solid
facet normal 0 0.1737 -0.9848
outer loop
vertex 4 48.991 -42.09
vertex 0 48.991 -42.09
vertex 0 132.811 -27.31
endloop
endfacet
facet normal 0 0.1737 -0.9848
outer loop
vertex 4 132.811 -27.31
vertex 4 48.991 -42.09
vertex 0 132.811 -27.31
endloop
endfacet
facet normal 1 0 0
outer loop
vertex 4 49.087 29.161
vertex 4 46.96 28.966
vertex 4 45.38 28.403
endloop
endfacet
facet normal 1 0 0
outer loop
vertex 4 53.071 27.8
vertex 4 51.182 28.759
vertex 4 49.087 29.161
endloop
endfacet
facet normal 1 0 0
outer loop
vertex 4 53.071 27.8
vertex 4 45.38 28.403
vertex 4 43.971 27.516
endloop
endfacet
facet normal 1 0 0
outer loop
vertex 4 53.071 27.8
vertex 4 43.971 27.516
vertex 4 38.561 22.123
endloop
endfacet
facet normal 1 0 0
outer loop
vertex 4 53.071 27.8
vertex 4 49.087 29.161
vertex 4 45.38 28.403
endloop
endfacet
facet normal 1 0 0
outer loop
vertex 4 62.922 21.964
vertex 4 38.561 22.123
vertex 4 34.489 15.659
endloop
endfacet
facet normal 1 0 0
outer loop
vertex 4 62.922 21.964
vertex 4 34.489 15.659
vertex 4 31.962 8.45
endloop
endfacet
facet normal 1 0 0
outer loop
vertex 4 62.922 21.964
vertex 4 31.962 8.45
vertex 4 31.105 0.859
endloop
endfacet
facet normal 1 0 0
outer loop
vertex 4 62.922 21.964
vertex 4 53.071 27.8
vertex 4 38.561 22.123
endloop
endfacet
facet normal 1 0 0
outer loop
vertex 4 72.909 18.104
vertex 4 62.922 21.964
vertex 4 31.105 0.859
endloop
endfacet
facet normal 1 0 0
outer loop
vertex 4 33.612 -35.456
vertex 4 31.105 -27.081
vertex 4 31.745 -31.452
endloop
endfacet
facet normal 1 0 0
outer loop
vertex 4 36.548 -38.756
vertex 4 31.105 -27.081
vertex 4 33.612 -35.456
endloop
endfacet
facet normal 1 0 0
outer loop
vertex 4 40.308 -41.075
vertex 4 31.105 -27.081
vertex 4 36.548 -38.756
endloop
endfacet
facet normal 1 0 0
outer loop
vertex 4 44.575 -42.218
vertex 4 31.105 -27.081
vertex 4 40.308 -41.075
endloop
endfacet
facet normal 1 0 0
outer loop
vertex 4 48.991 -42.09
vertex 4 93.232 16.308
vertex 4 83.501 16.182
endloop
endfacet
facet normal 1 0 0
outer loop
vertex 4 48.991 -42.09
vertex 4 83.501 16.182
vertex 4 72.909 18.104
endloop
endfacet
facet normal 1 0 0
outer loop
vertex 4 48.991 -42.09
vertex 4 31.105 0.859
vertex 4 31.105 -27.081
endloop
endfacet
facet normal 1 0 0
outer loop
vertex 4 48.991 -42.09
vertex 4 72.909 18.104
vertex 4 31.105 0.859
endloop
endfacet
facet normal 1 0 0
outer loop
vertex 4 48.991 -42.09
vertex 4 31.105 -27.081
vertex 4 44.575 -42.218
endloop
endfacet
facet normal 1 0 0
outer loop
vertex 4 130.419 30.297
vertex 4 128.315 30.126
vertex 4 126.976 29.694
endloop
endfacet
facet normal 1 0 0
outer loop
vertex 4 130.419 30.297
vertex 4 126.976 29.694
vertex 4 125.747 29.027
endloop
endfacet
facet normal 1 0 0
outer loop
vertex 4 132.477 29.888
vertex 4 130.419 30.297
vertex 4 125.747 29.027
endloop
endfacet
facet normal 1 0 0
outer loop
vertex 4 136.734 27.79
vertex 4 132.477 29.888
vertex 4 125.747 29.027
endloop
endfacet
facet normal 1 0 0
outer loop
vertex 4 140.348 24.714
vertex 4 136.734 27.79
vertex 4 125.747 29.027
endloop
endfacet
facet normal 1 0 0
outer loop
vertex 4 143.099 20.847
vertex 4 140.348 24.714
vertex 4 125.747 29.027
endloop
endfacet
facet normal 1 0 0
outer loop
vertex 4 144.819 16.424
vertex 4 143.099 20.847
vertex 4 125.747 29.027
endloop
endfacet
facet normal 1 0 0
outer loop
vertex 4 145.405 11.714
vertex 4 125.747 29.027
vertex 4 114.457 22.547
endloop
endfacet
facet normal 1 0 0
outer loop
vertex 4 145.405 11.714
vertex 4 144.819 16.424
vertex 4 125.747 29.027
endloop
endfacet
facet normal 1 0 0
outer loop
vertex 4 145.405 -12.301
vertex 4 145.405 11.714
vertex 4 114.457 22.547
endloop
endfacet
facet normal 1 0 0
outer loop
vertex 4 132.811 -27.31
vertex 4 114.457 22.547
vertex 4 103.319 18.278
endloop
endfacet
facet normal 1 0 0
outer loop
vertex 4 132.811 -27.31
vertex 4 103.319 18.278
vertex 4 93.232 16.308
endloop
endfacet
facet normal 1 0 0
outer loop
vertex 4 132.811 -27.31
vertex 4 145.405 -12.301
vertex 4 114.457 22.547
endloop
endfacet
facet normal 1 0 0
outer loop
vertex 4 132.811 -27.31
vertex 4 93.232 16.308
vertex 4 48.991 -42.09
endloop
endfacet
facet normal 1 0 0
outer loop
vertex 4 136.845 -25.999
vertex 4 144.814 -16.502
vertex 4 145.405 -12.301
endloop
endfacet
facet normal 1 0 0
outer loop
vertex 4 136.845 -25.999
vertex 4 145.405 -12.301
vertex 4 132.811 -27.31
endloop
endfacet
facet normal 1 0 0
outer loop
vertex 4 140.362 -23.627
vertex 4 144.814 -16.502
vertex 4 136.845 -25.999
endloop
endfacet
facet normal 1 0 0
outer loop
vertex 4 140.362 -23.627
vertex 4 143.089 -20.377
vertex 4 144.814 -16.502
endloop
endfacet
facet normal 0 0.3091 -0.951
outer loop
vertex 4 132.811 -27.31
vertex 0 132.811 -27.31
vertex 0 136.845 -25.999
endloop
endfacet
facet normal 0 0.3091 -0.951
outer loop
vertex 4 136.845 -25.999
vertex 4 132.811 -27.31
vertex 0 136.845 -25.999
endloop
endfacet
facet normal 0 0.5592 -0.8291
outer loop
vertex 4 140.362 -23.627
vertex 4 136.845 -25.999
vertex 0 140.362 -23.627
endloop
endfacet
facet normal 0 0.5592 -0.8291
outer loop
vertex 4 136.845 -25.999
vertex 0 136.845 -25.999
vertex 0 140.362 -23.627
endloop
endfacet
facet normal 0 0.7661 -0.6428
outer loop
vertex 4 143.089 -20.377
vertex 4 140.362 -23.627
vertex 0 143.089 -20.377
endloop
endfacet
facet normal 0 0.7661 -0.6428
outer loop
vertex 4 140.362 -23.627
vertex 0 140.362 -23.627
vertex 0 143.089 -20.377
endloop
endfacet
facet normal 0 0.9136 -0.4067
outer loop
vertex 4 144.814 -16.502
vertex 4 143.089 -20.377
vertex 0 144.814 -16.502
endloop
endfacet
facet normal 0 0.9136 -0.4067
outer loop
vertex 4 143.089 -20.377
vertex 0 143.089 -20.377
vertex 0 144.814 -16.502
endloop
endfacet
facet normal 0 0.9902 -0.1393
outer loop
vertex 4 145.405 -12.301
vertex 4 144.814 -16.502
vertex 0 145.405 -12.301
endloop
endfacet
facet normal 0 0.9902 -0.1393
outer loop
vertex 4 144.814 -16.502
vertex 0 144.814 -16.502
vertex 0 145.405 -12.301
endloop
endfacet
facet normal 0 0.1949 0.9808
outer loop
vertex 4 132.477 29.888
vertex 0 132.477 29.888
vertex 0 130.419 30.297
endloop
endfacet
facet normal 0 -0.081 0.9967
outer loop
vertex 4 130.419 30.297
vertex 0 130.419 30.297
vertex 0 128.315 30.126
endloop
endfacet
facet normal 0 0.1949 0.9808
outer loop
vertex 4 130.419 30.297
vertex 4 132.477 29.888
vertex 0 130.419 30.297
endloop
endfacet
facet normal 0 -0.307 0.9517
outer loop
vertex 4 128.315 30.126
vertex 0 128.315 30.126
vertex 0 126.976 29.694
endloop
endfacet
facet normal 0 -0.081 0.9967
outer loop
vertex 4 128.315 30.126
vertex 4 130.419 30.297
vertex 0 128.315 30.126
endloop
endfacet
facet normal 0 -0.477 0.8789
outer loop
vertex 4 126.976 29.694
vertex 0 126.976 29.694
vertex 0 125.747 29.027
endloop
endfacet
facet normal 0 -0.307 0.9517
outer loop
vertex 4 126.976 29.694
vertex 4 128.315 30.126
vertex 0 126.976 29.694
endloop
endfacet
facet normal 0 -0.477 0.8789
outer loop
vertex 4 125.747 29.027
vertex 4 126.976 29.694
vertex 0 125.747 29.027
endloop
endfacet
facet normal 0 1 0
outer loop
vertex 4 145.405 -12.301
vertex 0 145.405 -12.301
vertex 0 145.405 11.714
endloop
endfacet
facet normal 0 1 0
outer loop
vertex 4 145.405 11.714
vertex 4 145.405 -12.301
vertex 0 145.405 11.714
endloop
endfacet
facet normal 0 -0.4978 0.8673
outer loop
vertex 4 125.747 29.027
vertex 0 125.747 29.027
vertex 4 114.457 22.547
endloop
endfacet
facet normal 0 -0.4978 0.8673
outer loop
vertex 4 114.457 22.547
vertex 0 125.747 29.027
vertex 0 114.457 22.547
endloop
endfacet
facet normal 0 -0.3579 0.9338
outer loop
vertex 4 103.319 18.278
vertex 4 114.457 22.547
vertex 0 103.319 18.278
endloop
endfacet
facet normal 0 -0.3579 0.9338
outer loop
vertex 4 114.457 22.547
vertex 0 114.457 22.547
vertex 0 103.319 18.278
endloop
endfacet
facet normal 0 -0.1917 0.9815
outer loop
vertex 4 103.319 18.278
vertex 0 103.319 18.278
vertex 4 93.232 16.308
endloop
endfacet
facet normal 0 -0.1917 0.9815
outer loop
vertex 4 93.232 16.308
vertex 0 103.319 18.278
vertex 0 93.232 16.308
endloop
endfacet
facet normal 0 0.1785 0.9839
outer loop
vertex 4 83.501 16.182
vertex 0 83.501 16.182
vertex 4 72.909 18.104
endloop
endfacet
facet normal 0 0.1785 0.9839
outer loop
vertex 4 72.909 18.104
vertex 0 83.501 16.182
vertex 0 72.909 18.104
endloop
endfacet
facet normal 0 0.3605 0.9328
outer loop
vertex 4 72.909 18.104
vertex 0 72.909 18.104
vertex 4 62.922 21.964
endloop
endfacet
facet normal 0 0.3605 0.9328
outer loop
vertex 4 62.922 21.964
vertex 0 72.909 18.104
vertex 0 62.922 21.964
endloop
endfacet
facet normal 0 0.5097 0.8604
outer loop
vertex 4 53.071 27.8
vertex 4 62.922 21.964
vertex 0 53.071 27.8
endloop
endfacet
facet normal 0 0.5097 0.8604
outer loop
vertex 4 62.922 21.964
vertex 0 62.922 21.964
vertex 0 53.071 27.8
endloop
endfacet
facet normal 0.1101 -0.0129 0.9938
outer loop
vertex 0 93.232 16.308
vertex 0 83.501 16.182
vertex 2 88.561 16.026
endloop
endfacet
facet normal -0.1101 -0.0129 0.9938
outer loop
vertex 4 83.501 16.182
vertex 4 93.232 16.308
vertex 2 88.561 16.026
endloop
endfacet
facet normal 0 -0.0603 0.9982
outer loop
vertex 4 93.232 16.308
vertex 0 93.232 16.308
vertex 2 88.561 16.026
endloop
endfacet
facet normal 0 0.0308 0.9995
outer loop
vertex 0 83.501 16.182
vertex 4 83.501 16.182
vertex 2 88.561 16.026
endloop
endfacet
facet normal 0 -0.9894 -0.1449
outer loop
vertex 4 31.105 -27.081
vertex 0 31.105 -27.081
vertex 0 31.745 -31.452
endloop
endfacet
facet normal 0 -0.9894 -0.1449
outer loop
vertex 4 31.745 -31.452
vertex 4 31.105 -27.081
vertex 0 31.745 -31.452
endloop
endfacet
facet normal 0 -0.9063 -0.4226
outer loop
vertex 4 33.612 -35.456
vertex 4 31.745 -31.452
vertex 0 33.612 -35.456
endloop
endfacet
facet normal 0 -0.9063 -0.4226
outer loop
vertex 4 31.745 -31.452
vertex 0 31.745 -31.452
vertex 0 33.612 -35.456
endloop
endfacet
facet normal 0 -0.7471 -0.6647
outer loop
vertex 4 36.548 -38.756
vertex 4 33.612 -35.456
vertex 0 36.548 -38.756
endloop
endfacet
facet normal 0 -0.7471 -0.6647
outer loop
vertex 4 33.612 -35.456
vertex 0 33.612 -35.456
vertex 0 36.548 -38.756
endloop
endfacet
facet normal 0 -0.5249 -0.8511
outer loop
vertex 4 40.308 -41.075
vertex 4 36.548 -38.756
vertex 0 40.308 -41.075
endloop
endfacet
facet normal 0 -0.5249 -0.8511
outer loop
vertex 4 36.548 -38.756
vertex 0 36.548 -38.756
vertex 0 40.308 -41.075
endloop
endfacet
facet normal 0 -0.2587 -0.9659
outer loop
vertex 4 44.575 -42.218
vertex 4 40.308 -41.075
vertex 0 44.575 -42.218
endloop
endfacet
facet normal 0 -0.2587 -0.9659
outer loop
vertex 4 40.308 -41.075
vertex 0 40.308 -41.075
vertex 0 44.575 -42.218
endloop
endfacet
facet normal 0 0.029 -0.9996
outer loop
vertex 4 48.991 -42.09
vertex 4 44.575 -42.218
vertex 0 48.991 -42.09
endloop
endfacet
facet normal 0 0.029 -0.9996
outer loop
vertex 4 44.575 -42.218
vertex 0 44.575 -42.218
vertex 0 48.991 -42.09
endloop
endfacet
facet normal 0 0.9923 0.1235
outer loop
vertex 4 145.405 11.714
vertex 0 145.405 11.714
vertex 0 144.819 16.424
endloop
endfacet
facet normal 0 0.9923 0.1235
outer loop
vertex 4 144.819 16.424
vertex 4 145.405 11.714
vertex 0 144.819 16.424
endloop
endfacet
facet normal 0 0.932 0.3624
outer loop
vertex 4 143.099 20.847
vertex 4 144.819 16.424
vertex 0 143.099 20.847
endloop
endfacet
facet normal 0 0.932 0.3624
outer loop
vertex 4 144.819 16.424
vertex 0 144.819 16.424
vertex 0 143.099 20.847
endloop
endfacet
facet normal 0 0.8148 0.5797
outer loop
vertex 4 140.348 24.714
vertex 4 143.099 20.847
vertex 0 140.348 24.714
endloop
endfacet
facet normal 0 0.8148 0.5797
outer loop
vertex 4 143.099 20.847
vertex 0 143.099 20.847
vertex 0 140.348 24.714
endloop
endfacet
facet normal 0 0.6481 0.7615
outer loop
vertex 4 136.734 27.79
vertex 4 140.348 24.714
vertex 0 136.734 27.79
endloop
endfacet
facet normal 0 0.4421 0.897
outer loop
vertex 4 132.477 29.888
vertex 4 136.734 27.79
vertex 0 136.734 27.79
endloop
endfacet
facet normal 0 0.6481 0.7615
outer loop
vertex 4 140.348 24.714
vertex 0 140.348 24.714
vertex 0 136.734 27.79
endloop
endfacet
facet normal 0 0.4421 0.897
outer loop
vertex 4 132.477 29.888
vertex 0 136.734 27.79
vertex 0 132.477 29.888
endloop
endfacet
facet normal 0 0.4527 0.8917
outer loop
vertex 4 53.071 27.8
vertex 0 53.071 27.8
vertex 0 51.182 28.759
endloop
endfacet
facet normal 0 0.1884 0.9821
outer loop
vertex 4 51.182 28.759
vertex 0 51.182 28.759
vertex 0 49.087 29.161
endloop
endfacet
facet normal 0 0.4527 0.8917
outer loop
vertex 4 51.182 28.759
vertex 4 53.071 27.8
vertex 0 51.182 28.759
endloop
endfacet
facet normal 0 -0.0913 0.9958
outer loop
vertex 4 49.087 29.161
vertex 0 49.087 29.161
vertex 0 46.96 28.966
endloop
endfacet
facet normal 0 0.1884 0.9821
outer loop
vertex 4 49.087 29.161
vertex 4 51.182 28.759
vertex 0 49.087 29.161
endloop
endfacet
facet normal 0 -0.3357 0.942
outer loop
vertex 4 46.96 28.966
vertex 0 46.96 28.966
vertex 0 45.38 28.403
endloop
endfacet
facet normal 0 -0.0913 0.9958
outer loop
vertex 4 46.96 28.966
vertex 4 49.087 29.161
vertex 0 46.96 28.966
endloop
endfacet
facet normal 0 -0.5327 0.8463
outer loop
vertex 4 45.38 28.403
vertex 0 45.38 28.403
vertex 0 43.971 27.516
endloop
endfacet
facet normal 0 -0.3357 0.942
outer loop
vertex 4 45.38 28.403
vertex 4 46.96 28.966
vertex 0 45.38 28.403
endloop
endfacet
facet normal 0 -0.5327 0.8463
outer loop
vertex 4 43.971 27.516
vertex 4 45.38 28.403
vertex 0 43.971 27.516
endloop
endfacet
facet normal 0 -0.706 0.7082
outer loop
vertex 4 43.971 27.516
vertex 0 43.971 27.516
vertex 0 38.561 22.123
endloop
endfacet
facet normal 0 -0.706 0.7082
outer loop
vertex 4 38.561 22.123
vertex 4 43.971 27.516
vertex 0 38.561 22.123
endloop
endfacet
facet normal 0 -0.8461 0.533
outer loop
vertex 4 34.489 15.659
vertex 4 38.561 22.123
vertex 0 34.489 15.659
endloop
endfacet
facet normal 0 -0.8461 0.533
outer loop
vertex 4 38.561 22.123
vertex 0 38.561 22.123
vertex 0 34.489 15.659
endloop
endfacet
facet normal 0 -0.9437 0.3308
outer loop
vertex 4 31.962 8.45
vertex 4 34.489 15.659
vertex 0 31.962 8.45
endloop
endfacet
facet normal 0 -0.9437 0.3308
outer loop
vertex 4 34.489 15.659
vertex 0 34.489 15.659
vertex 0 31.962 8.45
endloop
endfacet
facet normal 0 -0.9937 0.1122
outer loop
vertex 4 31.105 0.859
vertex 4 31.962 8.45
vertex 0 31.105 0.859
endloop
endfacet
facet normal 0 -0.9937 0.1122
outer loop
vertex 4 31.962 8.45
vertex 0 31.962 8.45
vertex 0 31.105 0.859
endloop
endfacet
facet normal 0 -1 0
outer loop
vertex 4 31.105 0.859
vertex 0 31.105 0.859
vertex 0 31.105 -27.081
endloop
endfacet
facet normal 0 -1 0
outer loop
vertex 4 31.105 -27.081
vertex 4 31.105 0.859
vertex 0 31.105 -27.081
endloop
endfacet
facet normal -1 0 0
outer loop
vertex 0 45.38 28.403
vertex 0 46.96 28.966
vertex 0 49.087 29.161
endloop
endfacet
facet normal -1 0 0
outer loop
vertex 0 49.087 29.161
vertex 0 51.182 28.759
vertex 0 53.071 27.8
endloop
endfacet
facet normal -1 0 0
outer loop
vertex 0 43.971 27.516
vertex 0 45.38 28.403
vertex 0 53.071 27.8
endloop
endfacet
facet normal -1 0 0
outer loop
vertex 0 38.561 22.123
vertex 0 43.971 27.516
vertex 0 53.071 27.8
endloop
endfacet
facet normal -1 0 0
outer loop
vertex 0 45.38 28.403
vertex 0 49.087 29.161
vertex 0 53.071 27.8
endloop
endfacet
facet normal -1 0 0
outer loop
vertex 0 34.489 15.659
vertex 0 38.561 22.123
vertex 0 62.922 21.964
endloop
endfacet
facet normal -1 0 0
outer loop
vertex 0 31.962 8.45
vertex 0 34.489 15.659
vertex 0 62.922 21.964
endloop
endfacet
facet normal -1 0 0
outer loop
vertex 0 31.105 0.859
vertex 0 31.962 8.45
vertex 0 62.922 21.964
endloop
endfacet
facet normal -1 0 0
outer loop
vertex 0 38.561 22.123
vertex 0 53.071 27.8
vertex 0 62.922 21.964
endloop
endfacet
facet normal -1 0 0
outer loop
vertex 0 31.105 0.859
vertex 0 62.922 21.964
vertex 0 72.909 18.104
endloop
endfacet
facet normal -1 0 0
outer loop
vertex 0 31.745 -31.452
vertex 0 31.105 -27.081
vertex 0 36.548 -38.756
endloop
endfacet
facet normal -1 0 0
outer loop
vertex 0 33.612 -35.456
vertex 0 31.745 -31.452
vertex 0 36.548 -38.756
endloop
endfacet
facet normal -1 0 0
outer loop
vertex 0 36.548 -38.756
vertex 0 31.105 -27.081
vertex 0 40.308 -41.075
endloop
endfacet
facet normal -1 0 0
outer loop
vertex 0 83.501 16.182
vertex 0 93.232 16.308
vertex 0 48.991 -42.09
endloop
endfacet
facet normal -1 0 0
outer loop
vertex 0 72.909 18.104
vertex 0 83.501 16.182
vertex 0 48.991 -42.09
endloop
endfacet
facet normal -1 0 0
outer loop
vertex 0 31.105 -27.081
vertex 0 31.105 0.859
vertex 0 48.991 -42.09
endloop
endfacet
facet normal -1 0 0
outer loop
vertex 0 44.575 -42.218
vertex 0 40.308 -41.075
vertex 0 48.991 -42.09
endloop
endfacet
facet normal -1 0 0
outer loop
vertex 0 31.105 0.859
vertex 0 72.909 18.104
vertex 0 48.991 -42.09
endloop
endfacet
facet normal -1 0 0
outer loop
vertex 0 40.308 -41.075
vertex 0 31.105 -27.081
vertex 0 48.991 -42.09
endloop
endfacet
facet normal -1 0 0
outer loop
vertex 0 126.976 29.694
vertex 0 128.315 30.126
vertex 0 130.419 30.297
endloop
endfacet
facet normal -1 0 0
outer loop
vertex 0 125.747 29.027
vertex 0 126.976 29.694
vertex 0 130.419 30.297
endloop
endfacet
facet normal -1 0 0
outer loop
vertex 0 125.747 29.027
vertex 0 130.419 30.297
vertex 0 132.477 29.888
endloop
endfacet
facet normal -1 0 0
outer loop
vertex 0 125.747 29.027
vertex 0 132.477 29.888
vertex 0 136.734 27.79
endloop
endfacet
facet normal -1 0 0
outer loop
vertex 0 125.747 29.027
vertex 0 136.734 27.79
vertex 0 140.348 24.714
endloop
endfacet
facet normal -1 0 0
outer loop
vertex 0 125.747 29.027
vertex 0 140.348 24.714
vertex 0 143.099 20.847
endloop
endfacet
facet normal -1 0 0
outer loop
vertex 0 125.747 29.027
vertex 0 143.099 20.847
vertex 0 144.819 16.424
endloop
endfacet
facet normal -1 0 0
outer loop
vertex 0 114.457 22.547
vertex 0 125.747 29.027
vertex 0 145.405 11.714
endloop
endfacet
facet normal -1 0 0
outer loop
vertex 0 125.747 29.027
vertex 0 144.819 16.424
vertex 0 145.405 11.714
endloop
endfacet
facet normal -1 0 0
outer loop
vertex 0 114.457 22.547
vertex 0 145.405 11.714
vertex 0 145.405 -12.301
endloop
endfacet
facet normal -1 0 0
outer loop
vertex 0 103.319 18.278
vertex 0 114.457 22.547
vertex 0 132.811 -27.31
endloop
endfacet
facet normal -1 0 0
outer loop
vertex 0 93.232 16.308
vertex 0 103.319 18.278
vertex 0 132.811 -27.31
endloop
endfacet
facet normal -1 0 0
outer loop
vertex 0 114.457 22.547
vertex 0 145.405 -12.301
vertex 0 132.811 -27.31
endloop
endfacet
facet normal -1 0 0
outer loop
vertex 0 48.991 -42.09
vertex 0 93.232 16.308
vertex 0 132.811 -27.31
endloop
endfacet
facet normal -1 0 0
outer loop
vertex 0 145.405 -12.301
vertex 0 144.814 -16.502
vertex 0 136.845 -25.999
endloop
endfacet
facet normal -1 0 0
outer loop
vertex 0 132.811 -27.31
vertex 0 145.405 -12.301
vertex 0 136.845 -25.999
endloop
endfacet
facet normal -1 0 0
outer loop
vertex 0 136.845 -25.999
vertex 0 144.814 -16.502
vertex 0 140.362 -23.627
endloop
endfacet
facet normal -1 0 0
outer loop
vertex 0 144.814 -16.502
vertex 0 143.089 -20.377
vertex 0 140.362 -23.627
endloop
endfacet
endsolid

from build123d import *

# Parameters (mm, degrees)
BOSS_EXTRUDE1_DEPTH = 4
FILLET1_R           = 7.62
FILLET2_R           = 7.62


with BuildPart() as part:
    # Sketch1 → Boss-Extrude1 (new body)
    with BuildSketch(Plane(origin=(0, 0, 0), x_dir=(0, 0, -1), z_dir=(1, 0, 0))):
        with BuildLine():
            Line((-0.858815867, 31.104520152), (27.081184133, 31.104520152))
            ThreePointArc((27.081184133, 31.104520152), (38.755701446, 36.548436981), (42.089654289, 48.99091838))
            Line((42.089654289, 48.99091838), (27.309926766, 132.81091838))
            ThreePointArc((27.309926766, 132.81091838), (22.097539782, 141.839037466), (12.30145661, 145.404520152))
            Line((12.30145661, 145.404520152), (-11.714075954, 145.404520152))
            ThreePointArc((-11.714075954, 145.404520152), (-24.518671733, 140.524264284), (-30.82684486, 128.359498679))
            add(Edge.make_bspline(
                [(-30.82684486, 128.359498679), (-1.209368429, 86.647497598), (-30.82684486, 48.99091838)],
                knots=[0, 0, 0, 1, 1, 1], degree=2))
            ThreePointArc((-30.82684486, 48.99091838), (-18.308787237, 35.916095552), (-0.858815867, 31.104520152))
        make_face()
    extrude(amount=BOSS_EXTRUDE1_DEPTH)

    # Fillet1
    fillet1_edges = [part.edges().sort_by_distance(p)[0] for p in [
        (2, 128.359498679, 30.82684486),
    ]]
    fillet(fillet1_edges, radius=FILLET1_R)

    # Fillet2
    fillet2_edges = [part.edges().sort_by_distance(p)[0] for p in [
        (2, 48.99091838, 30.82684486),
    ]]
    fillet(fillet2_edges, radius=FILLET2_R)


solid = part.part
